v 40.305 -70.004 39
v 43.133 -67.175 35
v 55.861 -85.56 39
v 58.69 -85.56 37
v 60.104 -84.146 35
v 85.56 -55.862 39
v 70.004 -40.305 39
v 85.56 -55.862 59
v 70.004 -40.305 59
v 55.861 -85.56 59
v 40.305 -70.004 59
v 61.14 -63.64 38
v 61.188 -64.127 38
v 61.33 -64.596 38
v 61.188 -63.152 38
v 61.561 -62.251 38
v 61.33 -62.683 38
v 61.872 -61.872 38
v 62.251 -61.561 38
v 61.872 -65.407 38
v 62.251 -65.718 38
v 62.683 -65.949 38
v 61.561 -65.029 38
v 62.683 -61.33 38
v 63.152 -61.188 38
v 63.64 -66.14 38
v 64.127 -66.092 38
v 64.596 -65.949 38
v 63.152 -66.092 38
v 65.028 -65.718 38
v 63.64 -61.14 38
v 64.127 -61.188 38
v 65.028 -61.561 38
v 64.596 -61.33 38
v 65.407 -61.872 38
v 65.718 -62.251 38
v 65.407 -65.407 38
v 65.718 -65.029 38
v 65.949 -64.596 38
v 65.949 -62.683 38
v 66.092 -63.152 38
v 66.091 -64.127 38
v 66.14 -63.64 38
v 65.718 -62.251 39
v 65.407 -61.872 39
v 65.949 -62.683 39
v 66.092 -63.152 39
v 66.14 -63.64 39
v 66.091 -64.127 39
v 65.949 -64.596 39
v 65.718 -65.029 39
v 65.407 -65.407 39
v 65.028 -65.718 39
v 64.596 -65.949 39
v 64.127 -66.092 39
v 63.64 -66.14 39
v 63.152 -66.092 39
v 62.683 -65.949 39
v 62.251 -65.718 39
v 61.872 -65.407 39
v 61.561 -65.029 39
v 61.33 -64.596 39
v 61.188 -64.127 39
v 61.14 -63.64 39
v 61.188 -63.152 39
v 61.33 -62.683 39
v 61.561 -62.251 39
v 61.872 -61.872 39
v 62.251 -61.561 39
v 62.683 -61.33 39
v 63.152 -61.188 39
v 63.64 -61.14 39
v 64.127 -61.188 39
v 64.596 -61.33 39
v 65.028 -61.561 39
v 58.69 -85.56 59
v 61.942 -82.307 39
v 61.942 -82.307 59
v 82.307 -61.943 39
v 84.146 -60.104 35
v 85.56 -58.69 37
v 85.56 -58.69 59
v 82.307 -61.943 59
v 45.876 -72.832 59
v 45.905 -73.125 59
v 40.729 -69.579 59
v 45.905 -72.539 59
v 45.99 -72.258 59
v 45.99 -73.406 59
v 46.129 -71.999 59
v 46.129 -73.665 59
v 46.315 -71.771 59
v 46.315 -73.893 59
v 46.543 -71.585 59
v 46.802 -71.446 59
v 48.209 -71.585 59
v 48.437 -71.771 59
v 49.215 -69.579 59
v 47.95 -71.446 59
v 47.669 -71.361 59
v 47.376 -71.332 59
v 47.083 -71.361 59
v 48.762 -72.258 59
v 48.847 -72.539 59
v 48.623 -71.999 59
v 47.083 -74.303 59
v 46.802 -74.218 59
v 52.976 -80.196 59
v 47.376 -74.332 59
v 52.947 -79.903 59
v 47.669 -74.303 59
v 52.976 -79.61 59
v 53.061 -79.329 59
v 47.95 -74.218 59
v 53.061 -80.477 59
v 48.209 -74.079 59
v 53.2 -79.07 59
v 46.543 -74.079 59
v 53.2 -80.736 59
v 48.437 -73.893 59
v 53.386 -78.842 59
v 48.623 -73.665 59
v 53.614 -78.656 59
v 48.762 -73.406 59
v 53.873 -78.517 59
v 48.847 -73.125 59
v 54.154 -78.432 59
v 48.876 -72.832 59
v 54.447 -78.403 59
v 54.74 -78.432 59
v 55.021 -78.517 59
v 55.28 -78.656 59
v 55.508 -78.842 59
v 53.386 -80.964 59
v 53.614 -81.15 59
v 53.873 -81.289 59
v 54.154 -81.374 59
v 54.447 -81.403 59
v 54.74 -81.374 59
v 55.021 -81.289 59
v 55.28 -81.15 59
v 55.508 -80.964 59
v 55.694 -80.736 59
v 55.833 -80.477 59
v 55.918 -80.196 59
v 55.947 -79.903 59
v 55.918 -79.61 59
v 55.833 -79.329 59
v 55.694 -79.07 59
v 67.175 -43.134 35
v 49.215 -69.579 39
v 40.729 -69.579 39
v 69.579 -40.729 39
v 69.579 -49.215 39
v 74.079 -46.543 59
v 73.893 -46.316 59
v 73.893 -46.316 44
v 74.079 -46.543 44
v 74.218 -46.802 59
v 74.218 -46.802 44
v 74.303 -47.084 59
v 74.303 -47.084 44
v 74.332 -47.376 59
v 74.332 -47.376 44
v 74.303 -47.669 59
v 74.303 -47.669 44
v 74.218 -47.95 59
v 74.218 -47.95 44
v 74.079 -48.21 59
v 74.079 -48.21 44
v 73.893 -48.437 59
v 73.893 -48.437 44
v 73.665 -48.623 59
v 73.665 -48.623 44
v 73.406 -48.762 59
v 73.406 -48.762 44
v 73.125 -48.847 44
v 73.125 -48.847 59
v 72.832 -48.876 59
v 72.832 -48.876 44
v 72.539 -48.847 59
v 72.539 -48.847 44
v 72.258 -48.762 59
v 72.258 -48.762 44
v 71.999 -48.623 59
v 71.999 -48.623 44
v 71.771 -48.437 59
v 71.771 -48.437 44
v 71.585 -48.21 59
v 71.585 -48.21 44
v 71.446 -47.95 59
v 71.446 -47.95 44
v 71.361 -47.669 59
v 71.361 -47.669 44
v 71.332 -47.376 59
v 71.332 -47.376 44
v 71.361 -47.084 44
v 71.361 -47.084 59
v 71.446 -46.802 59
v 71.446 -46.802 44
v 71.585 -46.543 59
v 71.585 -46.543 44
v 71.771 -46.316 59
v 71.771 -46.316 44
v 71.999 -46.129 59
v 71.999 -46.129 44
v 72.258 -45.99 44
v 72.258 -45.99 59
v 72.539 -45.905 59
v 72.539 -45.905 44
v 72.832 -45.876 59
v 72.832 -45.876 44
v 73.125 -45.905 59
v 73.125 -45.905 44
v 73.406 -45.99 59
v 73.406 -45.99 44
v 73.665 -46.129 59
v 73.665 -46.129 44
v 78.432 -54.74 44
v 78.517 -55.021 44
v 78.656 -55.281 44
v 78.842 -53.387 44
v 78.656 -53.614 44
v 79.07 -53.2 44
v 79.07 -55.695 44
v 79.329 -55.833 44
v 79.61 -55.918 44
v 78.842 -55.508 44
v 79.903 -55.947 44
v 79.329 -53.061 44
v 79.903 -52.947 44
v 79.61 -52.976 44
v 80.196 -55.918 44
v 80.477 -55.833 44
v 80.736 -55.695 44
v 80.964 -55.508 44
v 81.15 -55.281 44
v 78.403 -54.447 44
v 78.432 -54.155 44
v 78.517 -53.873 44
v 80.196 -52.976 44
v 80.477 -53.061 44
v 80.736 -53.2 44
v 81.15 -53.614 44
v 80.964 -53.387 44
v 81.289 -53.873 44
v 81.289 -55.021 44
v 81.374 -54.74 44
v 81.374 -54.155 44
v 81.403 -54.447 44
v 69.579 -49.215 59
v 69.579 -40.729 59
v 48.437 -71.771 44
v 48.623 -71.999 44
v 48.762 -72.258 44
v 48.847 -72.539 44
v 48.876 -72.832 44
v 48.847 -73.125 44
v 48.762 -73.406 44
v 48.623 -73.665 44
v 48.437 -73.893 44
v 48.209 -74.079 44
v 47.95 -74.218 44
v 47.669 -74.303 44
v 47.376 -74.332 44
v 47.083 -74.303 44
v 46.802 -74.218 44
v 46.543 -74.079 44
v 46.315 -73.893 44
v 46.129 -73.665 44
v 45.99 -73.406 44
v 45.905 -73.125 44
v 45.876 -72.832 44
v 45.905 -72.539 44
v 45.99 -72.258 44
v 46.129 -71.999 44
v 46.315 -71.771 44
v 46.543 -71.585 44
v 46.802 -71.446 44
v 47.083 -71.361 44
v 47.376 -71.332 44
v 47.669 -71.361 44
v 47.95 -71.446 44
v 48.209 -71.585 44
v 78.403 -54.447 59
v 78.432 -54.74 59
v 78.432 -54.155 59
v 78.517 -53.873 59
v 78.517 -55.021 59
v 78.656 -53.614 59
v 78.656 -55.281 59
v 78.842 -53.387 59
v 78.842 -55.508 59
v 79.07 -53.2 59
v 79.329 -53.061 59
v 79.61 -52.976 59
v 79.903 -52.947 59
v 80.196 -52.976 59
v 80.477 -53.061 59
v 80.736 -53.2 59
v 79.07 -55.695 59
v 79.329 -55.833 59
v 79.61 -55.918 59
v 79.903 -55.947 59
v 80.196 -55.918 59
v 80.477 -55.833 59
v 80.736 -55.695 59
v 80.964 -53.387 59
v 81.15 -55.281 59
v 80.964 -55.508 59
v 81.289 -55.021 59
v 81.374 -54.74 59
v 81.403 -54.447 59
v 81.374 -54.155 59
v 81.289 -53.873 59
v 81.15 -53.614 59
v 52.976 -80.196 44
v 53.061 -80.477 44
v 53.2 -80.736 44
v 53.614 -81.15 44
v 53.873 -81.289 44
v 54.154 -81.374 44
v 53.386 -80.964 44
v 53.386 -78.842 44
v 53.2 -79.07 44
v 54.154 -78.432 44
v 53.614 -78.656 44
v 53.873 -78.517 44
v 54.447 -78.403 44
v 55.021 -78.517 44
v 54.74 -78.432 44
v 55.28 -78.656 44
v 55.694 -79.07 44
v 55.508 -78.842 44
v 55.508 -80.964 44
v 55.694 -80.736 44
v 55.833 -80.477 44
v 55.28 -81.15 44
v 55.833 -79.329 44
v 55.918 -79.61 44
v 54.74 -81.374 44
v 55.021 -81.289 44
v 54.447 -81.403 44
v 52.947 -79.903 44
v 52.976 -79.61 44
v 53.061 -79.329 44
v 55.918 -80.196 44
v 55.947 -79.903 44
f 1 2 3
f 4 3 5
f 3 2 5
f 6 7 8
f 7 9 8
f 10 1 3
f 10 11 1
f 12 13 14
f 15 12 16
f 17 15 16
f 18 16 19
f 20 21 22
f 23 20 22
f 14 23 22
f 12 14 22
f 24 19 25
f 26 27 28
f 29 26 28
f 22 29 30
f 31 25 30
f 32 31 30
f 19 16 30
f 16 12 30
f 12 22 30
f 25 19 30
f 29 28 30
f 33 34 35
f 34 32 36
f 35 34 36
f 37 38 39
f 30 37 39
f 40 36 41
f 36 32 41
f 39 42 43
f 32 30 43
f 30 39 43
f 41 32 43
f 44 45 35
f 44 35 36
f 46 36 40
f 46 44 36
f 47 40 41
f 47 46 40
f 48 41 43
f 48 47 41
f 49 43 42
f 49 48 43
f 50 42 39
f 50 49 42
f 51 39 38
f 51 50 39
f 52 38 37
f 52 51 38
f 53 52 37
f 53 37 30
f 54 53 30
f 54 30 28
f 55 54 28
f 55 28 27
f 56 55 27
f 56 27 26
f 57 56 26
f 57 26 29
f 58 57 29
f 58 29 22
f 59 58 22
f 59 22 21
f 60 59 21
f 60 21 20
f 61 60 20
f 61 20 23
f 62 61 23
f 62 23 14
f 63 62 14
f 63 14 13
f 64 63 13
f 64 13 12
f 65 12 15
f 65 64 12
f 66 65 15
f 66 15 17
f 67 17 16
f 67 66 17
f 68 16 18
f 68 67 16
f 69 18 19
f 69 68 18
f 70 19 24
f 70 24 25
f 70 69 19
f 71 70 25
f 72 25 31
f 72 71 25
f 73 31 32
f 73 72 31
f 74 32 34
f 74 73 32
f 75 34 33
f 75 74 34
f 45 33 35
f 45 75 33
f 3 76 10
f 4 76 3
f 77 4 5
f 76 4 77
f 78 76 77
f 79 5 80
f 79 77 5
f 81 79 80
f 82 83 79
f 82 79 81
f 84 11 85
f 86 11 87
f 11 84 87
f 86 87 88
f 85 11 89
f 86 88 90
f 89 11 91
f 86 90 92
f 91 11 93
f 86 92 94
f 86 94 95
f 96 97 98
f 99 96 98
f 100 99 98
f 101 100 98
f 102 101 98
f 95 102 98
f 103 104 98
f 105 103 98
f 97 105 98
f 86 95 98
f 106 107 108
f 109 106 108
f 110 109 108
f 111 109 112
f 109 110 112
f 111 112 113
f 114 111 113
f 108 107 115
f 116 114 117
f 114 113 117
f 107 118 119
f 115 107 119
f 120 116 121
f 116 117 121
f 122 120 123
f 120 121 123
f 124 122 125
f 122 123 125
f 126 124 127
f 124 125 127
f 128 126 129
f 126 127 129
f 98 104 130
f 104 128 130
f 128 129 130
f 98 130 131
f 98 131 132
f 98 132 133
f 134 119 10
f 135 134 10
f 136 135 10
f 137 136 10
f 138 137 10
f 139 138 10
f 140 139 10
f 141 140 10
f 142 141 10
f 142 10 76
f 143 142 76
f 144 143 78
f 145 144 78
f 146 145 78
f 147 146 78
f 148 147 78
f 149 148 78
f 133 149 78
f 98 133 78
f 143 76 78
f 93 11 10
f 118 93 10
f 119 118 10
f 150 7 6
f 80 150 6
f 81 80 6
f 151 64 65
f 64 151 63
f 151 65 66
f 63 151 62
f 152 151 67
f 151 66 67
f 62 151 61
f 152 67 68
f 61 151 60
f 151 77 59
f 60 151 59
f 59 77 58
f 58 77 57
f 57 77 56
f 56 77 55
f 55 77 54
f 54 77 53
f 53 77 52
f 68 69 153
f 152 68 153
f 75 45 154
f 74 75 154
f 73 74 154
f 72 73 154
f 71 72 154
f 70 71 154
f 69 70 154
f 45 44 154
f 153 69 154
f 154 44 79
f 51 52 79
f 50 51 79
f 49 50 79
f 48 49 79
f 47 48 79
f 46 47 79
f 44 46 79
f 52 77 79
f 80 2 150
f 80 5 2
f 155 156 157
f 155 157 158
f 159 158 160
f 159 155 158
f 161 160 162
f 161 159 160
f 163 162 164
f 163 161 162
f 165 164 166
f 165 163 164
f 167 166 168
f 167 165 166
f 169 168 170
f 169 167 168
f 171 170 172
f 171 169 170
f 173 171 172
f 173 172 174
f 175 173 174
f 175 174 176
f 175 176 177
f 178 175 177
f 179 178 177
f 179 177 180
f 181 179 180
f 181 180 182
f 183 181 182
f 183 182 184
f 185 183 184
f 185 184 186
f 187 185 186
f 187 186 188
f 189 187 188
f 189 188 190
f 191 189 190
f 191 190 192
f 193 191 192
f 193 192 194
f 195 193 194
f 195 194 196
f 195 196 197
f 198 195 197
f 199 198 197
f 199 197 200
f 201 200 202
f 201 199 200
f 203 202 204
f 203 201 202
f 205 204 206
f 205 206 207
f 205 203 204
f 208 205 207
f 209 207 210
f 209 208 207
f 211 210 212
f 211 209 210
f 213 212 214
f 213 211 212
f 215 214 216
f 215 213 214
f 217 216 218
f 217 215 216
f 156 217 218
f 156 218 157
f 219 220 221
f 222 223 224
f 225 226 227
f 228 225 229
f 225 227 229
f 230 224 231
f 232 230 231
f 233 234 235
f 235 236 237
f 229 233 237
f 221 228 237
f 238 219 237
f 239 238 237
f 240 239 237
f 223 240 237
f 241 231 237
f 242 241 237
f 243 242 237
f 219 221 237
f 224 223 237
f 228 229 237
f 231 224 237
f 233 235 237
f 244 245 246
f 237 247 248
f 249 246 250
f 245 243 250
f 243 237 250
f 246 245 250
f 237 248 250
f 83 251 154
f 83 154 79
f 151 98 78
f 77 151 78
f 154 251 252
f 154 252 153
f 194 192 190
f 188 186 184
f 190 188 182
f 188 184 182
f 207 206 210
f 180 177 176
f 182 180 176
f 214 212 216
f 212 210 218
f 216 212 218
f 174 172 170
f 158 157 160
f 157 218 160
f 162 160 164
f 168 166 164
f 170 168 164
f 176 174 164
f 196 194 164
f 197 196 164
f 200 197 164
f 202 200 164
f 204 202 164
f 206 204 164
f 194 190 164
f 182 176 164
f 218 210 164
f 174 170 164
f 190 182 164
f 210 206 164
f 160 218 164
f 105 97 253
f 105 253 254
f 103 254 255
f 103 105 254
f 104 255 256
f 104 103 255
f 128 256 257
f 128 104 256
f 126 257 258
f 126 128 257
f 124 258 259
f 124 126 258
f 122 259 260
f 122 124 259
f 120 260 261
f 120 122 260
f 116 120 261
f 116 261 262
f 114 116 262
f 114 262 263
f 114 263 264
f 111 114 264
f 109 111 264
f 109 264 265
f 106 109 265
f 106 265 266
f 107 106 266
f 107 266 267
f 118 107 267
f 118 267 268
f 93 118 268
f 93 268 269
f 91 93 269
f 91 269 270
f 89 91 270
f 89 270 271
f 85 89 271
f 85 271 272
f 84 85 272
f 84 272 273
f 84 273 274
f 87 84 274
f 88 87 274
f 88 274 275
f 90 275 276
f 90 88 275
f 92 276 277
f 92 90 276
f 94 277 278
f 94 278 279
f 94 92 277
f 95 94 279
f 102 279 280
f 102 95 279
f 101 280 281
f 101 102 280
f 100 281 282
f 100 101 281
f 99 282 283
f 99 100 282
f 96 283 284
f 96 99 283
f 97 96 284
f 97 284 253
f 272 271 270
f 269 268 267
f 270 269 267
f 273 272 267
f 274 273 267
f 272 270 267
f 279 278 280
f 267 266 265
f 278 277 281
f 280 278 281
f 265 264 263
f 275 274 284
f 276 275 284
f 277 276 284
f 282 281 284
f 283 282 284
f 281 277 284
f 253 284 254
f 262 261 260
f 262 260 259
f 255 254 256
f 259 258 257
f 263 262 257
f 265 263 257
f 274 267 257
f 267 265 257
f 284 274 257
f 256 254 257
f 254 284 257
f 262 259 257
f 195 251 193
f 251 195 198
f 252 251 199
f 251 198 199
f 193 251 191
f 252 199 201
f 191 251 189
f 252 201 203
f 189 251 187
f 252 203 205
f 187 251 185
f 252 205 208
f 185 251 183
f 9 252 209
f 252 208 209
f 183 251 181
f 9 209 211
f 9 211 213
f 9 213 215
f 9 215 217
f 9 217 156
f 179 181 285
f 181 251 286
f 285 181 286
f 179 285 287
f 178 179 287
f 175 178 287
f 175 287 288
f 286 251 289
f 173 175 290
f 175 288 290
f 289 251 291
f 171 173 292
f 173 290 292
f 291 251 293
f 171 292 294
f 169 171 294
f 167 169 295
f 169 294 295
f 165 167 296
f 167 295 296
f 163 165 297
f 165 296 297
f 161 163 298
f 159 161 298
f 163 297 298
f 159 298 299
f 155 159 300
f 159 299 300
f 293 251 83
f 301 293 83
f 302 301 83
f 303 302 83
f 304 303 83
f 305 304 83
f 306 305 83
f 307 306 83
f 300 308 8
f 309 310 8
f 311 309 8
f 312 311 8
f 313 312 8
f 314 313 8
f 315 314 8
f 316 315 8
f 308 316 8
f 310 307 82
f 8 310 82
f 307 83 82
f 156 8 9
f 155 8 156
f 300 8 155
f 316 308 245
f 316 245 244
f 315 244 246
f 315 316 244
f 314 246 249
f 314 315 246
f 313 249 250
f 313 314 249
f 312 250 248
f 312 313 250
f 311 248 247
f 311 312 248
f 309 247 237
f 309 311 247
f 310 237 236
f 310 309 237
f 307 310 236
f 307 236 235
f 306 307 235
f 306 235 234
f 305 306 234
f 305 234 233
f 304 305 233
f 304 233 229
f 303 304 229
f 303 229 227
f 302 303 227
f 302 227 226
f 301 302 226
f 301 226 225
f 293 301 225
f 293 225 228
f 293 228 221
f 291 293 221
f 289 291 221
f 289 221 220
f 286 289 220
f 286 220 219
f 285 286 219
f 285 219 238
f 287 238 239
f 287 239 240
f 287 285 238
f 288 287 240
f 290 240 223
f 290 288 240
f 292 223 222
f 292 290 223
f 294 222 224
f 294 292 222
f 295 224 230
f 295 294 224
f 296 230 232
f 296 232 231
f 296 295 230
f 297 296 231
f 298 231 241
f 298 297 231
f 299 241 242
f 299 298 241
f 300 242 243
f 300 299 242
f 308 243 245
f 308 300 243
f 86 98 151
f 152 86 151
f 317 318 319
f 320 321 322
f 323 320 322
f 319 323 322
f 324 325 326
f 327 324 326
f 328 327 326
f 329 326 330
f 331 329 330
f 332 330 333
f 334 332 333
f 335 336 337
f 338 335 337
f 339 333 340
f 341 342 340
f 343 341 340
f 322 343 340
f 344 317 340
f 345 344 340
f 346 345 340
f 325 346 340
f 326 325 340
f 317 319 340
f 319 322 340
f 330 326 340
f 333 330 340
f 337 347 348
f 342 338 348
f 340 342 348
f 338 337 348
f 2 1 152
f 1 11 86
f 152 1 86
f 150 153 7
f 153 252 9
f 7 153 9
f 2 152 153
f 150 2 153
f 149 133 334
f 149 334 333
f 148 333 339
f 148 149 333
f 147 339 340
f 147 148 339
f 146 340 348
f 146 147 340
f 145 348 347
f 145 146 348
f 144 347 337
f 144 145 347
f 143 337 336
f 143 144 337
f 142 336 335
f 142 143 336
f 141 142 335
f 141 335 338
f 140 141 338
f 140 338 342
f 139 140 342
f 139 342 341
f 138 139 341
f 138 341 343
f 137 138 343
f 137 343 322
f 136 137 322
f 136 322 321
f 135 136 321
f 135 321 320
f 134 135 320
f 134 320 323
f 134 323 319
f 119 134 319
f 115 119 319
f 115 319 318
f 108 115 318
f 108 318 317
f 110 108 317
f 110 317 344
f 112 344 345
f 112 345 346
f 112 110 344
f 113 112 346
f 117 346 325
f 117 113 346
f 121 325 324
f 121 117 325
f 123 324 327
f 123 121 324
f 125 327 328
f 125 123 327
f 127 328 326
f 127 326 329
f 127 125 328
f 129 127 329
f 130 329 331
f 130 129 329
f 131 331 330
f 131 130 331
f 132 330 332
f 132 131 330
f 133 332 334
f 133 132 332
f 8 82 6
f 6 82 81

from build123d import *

# Parameters (mm, degrees)
CYLINDER1700_R             = 1.5
CYLINDER1700_DEPTH         = 60
CYLINDER1701_R             = 1.5
CYLINDER1701_DEPTH         = 60
CYLINDER1702_R             = 1.5
CYLINDER1702_DEPTH         = 60
CYLINDER1699_R             = 1.5
CYLINDER1699_DEPTH         = 60
CYLINDER1698_R             = 2.5
CYLINDER1698_DEPTH         = 48
BOX666_W                   = 28.8
BOX666_H                   = 34.21
BOX666_DEPTH               = 20
BOX667_W                   = 42
BOX667_H                   = 24
BOX667_DEPTH               = 24
CHAMFER038_SIZE            = 6
CHAMFER039_SIZE            = 4
CHAMFER044_SIZE            = 2
CHAMFER044_ROLL_ANGLE      = 180
CHAMFER044_PLACEMENT_ANGLE = 44.999934


with BuildPart() as v_lec1700:
    # Cylinder1700 → Cylinder1700 (new body)
    with BuildSketch(Plane(origin=(18, 85, -57), x_dir=(1, 0, 0), z_dir=(0, 0, 1))):
        Circle(CYLINDER1700_R)
    extrude(amount=CYLINDER1700_DEPTH)


with BuildPart() as v_lec1701:
    # Cylinder1701 → Cylinder1701 (new body)
    with BuildSketch(Plane(origin=(-18, 85, -57), x_dir=(1, 0, 0), z_dir=(0, 0, 1))):
        Circle(CYLINDER1701_R)
    extrude(amount=CYLINDER1701_DEPTH)


with BuildPart() as v_lec1702:
    # Cylinder1702 → Cylinder1702 (new body)
    with BuildSketch(Plane(origin=(-18, 95, -57), x_dir=(1, 0, 0), z_dir=(0, 0, 1))):
        Circle(CYLINDER1702_R)
    extrude(amount=CYLINDER1702_DEPTH)


with BuildPart() as compound843:
    # Cylinder1699 → Cylinder1699 (new body)
    with BuildSketch(Plane(origin=(18, 95, -57), x_dir=(1, 0, 0), z_dir=(0, 0, 1))):
        Circle(CYLINDER1699_R)
    extrude(amount=CYLINDER1699_DEPTH)

    # Compound843: union Válec1700, Válec1701, Válec1702
    add(v_lec1700.part)
    add(v_lec1701.part)
    add(v_lec1702.part)


with BuildPart() as compound843_1:
    # Compound843 placement: moved
    add(compound843.part.moved(Location((0, 0, -16))))


with BuildPart() as v_lec1698:
    # Cylinder1698 → Cylinder1698 (new body)
    with BuildSketch(Plane(origin=(0, 90, -55), x_dir=(1, 0, 0), z_dir=(0, 0, 1))):
        Circle(CYLINDER1698_R)
    extrude(amount=CYLINDER1698_DEPTH)


with BuildPart() as compound805:
    # Box666 → Box666 (new body)
    with BuildSketch(Plane(origin=(-14.4, -15.34, 34), x_dir=(1, 0, 0), z_dir=(0, 0, 1))):
        with Locations((14.4, 17.105)):
            Rectangle(BOX666_W, BOX666_H)
    extrude(amount=BOX666_DEPTH)


with BuildPart() as compound805_1:
    # Compound805 placement: moved
    add(compound805.part.moved(Location((0, 90, -83))))


with BuildPart() as chamfer044:
    # Box667 → Box667 (new body)
    with BuildSketch(Plane(origin=(-21, 78, -49), x_dir=(1, 0, 0), z_dir=(0, 0, 1))):
        with Locations((21, 12)):
            Rectangle(BOX667_W, BOX667_H)
    extrude(amount=BOX667_DEPTH)

    # Cut315: cut Compound805
    add(compound805_1.part, mode=Mode.SUBTRACT)


with BuildPart() as chamfer044_1:
    # Cut315 placement: moved
    add(chamfer044.part.moved(Location((0, 0, 21))))

    # Cut316: cut Válec1698
    add(v_lec1698.part, mode=Mode.SUBTRACT)

    # Chamfer038
    chamfer038_edges = [chamfer044_1.edges().sort_by_distance(p)[0] for p in [
        (-14.4, 78, -18),
        (14.4, 78, -18),
    ]]
    chamfer(chamfer038_edges, length=CHAMFER038_SIZE)

    # Cut325: cut Compound843
    add(compound843_1.part, mode=Mode.SUBTRACT)

    # Chamfer039
    chamfer039_edges = [chamfer044_1.edges().sort_by_distance(p)[0] for p in [
        (-21, 90, -4),
        (21, 90, -4),
    ]]
    chamfer(chamfer039_edges, length=CHAMFER039_SIZE)

    # Chamfer044
    chamfer044_edges = [chamfer044_1.edges().sort_by_distance(p)[0] for p in [
        (-21, 102, -18),
        (21, 102, -18),
    ]]
    chamfer(chamfer044_edges, length=CHAMFER044_SIZE)


with BuildPart() as chamfer044_2:
    # Chamfer044 roll: moved
    add(chamfer044_1.part.rotate(Axis((0, 0, 0), (1, 0, 0)), CHAMFER044_ROLL_ANGLE))


with BuildPart() as chamfer044_3:
    # Chamfer044 placement: moved
    add(chamfer044_2.part.moved(Location((0, 0, 31))).rotate(Axis((0, 0, 31), (0, 0, 1)), CHAMFER044_PLACEMENT_ANGLE))


solid = chamfer044_3.part
